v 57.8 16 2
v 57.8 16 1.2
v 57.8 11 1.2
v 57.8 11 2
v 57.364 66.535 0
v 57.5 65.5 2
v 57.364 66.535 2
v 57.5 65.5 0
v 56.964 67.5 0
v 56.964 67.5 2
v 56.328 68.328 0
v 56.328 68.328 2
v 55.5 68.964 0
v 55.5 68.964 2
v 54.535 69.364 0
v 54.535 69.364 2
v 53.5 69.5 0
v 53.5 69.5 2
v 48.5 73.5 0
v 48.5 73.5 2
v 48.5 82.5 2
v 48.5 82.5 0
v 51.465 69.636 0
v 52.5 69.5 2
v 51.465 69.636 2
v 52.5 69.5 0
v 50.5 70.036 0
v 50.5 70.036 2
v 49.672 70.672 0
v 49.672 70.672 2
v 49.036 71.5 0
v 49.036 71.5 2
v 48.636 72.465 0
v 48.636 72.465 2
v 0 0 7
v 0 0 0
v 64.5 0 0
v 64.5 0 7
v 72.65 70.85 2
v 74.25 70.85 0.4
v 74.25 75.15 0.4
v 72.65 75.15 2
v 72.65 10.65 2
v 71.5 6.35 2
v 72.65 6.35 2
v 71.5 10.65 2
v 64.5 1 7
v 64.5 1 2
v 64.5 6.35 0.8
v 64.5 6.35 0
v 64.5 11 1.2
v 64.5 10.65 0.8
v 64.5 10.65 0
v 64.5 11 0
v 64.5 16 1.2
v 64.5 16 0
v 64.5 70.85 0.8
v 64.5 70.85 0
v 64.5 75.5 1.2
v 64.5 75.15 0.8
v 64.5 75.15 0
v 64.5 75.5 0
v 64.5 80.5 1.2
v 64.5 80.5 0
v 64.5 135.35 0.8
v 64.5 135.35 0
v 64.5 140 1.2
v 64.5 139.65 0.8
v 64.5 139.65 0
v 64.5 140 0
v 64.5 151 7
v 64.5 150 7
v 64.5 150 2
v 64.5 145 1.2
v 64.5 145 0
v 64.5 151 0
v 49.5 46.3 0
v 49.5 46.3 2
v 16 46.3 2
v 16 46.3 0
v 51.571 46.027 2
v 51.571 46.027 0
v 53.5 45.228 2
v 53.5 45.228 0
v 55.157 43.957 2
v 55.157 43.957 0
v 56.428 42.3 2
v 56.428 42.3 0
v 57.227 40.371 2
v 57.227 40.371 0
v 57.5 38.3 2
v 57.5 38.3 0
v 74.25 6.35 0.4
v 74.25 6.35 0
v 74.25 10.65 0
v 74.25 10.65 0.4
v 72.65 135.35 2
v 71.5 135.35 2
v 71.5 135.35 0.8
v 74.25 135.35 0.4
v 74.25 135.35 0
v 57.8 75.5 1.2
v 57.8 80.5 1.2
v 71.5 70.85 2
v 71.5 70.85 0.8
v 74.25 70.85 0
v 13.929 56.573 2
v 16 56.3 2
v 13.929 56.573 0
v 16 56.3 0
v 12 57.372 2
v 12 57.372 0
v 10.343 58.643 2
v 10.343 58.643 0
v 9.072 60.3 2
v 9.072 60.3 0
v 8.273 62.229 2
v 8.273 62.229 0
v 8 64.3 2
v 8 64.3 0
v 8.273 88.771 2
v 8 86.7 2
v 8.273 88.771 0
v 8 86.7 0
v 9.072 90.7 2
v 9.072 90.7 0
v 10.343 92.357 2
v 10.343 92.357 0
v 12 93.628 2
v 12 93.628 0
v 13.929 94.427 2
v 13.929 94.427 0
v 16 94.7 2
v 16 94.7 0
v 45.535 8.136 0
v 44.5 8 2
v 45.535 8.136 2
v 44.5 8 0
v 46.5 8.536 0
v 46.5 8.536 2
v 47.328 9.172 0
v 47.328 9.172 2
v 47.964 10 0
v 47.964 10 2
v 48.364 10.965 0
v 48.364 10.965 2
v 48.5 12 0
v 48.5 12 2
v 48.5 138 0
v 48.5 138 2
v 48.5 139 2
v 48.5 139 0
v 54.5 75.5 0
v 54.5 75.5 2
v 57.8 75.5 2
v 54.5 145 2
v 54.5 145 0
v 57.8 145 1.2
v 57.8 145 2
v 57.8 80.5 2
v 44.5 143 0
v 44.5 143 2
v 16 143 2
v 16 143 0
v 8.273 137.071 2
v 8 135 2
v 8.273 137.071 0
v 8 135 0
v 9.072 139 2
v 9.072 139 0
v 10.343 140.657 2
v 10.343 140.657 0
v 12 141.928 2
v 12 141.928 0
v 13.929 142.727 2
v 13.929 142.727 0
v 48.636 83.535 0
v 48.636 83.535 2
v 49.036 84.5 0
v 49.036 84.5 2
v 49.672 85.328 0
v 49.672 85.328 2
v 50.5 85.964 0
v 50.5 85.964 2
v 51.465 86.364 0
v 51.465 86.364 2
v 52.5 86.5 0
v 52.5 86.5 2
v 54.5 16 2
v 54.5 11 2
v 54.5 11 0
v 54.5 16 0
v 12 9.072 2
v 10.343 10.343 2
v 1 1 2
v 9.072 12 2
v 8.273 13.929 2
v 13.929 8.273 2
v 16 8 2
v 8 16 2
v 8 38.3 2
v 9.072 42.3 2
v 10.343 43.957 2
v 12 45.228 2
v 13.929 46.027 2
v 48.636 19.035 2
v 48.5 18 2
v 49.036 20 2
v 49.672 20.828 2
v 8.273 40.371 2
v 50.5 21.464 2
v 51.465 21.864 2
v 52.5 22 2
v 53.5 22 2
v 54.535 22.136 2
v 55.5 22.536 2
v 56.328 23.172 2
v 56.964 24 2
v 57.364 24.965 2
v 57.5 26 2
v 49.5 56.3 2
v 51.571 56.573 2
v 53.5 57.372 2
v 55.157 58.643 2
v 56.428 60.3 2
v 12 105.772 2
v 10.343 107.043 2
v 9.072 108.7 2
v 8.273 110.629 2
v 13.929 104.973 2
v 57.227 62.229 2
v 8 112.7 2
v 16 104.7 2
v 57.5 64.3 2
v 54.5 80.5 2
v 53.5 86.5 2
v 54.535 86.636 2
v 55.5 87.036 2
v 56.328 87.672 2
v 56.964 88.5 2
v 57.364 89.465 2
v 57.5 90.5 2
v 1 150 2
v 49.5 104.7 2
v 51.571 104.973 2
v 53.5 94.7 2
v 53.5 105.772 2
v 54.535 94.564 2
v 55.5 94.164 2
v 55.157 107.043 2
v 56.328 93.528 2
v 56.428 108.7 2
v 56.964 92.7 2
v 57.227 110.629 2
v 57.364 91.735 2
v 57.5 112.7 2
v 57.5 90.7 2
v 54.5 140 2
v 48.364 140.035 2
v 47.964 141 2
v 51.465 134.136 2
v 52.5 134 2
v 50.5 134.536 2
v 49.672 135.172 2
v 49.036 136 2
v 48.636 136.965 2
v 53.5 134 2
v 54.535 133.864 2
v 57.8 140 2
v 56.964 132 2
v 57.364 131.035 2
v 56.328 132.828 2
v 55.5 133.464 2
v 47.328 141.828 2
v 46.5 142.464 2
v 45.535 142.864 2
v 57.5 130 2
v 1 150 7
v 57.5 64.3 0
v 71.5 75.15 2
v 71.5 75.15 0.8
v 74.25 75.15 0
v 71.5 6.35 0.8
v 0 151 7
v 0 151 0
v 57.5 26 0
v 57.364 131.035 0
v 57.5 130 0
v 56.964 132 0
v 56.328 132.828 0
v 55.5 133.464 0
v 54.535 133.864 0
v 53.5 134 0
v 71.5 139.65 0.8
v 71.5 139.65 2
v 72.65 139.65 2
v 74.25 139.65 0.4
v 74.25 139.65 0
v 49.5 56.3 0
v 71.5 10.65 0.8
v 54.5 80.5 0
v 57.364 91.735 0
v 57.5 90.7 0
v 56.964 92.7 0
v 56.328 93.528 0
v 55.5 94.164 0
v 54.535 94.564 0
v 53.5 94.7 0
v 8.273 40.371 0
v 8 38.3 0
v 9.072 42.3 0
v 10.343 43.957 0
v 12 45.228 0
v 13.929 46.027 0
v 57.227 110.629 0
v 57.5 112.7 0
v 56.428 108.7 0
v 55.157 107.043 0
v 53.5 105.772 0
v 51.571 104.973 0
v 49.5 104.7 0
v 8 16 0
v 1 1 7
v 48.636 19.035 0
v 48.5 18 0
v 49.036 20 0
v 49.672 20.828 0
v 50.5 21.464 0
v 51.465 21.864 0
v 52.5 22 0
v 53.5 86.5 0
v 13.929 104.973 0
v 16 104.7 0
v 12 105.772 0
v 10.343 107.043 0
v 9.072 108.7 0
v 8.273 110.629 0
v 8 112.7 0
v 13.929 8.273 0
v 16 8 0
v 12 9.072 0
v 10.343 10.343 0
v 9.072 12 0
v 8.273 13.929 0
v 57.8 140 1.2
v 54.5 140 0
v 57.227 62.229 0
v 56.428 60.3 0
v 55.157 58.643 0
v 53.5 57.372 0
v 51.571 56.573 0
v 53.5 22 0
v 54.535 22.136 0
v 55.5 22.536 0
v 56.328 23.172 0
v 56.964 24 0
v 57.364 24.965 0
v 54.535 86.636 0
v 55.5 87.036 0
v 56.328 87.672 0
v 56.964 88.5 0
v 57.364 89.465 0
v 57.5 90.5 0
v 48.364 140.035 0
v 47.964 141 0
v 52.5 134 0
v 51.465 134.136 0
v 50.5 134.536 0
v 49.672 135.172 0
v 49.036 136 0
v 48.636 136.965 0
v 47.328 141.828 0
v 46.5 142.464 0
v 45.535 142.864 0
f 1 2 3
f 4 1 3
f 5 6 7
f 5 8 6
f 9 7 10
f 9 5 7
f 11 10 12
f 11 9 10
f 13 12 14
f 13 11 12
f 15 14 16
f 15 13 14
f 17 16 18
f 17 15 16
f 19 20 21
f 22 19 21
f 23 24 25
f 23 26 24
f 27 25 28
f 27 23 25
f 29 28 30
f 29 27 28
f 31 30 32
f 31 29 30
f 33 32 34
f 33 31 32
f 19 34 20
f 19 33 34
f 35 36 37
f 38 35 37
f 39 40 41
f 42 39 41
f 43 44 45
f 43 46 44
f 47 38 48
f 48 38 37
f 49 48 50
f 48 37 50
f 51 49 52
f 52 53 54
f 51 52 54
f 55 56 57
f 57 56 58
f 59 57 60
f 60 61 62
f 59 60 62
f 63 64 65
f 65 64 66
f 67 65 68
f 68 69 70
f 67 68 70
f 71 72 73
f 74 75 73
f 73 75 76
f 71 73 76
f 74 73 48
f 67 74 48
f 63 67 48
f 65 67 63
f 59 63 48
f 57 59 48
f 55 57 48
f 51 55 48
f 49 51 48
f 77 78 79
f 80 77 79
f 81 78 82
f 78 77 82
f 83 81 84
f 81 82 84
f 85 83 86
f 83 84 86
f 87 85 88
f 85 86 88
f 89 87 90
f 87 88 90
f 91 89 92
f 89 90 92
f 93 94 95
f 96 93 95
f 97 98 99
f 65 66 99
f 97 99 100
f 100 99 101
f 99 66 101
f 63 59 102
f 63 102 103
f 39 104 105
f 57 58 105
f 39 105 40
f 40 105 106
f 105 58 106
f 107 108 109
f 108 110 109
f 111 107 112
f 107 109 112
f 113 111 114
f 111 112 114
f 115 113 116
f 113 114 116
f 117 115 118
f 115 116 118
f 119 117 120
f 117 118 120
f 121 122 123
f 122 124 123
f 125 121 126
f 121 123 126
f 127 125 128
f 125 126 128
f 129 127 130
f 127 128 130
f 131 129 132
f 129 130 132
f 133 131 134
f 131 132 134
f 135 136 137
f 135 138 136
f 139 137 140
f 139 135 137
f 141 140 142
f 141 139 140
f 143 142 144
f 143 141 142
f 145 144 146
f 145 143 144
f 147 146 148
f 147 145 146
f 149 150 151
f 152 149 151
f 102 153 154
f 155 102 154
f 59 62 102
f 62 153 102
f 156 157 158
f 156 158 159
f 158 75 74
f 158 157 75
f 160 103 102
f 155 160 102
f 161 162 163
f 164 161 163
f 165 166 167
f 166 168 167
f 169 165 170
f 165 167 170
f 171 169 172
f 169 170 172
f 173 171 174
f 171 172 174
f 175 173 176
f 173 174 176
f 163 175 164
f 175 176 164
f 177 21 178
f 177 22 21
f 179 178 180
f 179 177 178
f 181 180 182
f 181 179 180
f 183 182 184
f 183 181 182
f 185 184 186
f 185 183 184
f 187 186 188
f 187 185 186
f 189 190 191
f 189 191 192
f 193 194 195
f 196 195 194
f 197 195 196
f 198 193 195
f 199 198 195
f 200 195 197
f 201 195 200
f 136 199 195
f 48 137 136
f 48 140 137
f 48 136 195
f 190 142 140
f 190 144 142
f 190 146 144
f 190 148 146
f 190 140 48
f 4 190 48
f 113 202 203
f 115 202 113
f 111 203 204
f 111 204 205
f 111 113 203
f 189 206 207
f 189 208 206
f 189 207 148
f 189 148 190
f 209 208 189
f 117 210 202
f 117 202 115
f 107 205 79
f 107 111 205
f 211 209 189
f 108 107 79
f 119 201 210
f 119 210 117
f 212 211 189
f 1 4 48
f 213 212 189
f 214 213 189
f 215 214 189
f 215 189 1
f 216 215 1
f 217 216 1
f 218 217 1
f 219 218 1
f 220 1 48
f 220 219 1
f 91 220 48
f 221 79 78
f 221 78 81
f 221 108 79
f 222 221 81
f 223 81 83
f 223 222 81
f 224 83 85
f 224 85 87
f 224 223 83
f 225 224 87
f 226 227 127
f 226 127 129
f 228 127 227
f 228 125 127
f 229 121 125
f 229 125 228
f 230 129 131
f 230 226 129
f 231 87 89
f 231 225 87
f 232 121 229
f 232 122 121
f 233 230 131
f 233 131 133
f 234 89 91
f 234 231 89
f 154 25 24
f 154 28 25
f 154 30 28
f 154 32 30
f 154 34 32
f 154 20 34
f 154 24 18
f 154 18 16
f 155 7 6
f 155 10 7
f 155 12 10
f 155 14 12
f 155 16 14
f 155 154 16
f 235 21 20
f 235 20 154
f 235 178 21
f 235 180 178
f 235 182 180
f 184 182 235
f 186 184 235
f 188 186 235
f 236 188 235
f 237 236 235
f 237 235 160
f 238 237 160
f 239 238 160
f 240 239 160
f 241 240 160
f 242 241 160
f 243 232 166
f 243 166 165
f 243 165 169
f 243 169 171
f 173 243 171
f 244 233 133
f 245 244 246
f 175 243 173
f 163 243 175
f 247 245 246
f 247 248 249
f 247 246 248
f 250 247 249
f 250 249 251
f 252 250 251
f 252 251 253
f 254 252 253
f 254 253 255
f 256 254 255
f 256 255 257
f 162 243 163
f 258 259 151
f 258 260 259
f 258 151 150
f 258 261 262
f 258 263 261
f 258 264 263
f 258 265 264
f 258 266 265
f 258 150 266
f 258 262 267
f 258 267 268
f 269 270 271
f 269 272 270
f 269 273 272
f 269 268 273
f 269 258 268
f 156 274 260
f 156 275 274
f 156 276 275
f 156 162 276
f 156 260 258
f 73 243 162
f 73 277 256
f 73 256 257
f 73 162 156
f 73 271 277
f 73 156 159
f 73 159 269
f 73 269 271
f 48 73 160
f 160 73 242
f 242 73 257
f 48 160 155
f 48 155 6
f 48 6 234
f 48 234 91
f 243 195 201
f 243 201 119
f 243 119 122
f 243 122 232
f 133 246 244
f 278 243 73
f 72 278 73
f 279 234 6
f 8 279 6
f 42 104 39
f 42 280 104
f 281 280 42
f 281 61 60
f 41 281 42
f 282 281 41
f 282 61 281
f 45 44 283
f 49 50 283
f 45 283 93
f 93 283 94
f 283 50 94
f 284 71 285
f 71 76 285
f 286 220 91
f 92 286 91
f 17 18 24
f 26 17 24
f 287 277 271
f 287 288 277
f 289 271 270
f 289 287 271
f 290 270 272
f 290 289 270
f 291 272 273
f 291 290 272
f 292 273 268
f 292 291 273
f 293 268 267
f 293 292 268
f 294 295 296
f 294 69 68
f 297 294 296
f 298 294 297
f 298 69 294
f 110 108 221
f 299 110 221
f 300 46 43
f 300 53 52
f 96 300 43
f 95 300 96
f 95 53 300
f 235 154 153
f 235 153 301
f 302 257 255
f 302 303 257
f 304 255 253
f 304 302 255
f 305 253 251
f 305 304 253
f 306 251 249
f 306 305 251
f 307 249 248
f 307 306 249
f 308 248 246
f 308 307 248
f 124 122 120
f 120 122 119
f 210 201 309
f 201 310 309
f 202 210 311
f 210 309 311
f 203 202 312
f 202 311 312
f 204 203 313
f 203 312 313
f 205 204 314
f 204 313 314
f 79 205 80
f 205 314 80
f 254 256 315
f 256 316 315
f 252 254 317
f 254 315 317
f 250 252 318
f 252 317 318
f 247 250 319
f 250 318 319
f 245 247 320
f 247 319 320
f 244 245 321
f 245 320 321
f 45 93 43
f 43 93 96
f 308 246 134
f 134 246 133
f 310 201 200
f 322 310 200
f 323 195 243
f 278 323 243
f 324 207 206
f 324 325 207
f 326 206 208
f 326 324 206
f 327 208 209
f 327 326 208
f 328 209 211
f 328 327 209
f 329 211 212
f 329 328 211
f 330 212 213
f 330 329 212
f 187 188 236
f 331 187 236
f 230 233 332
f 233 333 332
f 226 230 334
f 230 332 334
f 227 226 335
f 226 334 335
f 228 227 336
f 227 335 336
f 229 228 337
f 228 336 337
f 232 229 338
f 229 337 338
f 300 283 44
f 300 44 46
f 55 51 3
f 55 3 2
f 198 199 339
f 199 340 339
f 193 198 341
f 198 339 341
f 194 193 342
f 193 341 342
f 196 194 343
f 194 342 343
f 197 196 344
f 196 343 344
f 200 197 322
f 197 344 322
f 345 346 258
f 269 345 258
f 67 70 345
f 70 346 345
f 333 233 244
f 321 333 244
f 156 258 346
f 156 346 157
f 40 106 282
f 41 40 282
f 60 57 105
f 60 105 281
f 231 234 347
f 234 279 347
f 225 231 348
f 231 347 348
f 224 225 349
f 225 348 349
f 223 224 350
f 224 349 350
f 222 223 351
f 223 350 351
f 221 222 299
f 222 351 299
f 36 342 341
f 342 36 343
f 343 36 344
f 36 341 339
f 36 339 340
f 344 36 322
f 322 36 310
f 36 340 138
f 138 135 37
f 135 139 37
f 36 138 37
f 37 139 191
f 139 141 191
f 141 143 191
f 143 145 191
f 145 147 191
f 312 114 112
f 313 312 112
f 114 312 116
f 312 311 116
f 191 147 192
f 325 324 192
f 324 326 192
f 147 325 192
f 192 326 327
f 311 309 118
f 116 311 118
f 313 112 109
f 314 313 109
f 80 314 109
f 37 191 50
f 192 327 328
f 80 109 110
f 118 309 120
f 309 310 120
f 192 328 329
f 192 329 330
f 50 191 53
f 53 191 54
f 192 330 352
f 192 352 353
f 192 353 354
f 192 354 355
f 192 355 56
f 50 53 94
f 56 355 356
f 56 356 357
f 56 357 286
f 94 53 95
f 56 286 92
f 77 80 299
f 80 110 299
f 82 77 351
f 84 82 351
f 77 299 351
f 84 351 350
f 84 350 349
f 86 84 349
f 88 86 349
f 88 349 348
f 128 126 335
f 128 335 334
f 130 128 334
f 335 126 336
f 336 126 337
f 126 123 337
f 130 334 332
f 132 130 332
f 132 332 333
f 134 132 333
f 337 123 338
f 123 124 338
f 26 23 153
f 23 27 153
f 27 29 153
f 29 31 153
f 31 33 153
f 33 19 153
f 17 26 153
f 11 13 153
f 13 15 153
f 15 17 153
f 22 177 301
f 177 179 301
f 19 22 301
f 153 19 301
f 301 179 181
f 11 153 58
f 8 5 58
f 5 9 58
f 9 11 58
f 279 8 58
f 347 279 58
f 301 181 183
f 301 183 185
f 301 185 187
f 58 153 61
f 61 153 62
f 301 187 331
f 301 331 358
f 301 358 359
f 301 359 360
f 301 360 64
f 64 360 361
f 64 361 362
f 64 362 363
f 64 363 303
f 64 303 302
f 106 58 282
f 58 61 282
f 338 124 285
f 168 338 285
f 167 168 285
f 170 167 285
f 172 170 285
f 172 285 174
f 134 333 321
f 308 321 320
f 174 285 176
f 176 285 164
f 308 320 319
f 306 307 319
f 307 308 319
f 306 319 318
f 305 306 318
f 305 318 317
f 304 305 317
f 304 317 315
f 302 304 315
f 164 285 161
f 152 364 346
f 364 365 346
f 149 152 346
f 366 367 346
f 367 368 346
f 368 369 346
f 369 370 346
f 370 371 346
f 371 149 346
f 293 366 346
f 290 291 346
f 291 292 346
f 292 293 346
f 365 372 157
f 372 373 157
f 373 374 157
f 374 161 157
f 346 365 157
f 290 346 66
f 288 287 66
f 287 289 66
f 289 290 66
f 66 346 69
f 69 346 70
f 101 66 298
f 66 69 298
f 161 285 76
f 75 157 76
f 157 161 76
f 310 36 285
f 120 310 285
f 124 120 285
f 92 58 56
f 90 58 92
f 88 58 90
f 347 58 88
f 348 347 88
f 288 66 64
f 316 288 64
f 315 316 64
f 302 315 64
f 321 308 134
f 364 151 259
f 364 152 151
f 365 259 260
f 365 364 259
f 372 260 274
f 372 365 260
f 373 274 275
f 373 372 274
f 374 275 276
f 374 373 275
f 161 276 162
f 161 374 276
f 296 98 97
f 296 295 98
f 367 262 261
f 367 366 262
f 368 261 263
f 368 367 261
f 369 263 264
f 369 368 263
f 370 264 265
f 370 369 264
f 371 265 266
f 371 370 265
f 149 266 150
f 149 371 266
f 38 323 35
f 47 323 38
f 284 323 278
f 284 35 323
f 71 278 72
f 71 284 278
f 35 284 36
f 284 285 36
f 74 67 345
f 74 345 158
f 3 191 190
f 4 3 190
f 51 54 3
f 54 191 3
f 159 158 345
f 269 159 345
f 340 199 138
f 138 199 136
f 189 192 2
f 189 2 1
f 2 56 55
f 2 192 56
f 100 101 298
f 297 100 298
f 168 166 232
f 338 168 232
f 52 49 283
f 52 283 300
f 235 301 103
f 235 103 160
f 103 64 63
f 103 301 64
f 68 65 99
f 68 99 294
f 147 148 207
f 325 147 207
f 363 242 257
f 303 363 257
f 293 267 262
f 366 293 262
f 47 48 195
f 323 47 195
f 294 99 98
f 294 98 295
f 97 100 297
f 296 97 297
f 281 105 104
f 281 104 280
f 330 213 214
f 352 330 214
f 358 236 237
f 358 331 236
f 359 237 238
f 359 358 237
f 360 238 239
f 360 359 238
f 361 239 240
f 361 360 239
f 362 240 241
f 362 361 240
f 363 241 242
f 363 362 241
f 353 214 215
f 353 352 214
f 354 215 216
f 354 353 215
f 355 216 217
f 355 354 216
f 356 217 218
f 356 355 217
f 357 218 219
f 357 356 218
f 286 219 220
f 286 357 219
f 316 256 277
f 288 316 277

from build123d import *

# Parameters (mm, degrees)
F0_W      = 64.5
F0_H      = 151
F1_DEPTH  = 2
F3_DEPTH  = 5
F4_W      = 5
F4_H      = 1.2
F5_DEPTH  = 10
F6_W      = 4.3
F6_H      = 0.8
F7_DEPTH  = 9.75
F8_W      = 2.75
F8_H      = 4.3
F9_DEPTH  = 1.2
F10_W     = 2.75
F10_H     = 4.3
F11_DEPTH = 1.2
F12_W     = 2.75
F12_H     = 4.3
F13_DEPTH = 1.2
F14_W     = 3.3
F14_H     = 5
F15_DEPTH = 5.801
F16_W     = 3.3
F16_H     = 5
F17_DEPTH = 5.801
F18_W     = 3.3
F18_H     = 5
F19_DEPTH = 5.801
F20_SIZE  = 1.6
F22_DEPTH = 2.001
F23_R     = 4
F24_R     = 8


with BuildPart() as f1:
    # F0 (on Top) → F1 (new body)
    with BuildSketch(Plane.XY):
        with Locations((32.25, 75.5)):
            Rectangle(F0_W, F0_H)
    extrude(amount=F1_DEPTH)

    # F2 (on face) → F3 (join)
    with BuildSketch(Plane.XY.offset(2)):
        Polygon((64.5, 150), (64.5, 151), (0, 151), (0, 0), (64.5, 0), (64.5, 1), (1, 1), (1, 150), align=None)
    extrude(amount=F3_DEPTH)

    # F4 (on face) → F5 (cut)
    with BuildSketch(Plane.YZ.offset(64.5)):
        with Locations((142.5, 0.6)):
            Rectangle(F4_W, F4_H)
        with Locations((78, 0.6)):
            Rectangle(F4_W, F4_H)
        with Locations((13.5, 0.6)):
            Rectangle(F4_W, F4_H)
    extrude(amount=-F5_DEPTH, mode=Mode.SUBTRACT)

    # F6 (on face) → F7 (join)
    with BuildSketch(Plane.YZ.offset(64.5)):
        with Locations((8.5, 0.4)):
            Rectangle(F6_W, F6_H)
        with Locations((73, 0.4)):
            Rectangle(F6_W, F6_H)
        with Locations((137.5, 0.4)):
            Rectangle(F6_W, F6_H)
    extrude(amount=F7_DEPTH)

    # F8 (on face) → F9 (join)
    with BuildSketch(Plane.XY.offset(0.8)):
        with Locations((72.875, 8.5)):
            Rectangle(F8_W, F8_H)
    extrude(amount=F9_DEPTH)

    # F10 (on face) → F11 (join)
    with BuildSketch(Plane.XY.offset(0.8)):
        with Locations((72.875, 73)):
            Rectangle(F10_W, F10_H)
    extrude(amount=F11_DEPTH)

    # F12 (on face) → F13 (join)
    with BuildSketch(Plane.XY.offset(0.8)):
        with Locations((72.875, 137.5)):
            Rectangle(F12_W, F12_H)
    extrude(amount=F13_DEPTH)

    # F14 (on face) → F15 (cut, through all)
    with BuildSketch(Plane(origin=(0, 0, 1.2), x_dir=(1, 0, 0), z_dir=(0, 0, -1))):
        with Locations((56.15, -13.5)):
            Rectangle(F14_W, F14_H)
    extrude(amount=-F15_DEPTH, mode=Mode.SUBTRACT)

    # F16 (on face) → F17 (cut, through all)
    with BuildSketch(Plane(origin=(0, 0, 1.2), x_dir=(1, 0, 0), z_dir=(0, 0, -1))):
        with Locations((56.15, -78)):
            Rectangle(F16_W, F16_H)
    extrude(amount=-F17_DEPTH, mode=Mode.SUBTRACT)

    # F18 (on face) → F19 (cut, through all)
    with BuildSketch(Plane(origin=(0, 0, 1.2), x_dir=(1, 0, 0), z_dir=(0, 0, -1))):
        with Locations((56.15, -142.5)):
            Rectangle(F18_W, F18_H)
    extrude(amount=-F19_DEPTH, mode=Mode.SUBTRACT)

    # F20
    f20_edges = [f1.edges().sort_by_distance(p)[0] for p in [
        (74.25, 8.5, 2),
        (74.25, 73, 2),
        (74.25, 137.5, 2),
    ]]
    chamfer(f20_edges, length=F20_SIZE)

    # F21 (on face) → F22 (cut, through all)
    with BuildSketch(Plane.XY.offset(2)):
        Polygon((8, 143), (8, 104.7), (57.5, 104.7), (57.5, 134), (48.5, 134), (48.5, 143), align=None)
        Polygon((8, 56.3), (57.5, 56.3), (57.5, 69.5), (48.5, 69.5), (48.5, 86.5), (57.5, 86.5), (57.5, 94.7), (8, 94.7), align=None)
        Polygon((8, 46.3), (8, 8), (48.5, 8), (48.5, 22), (57.5, 22), (57.5, 46.3), align=None)
    extrude(amount=-F22_DEPTH, mode=Mode.SUBTRACT)

    # F23
    f23_edges = [f1.edges().sort_by_distance(p)[0] for p in [
        (48.5, 134, 1),
        (48.5, 143, 1),
        (57.5, 134, 1),
        (57.5, 94.7, 1),
        (48.5, 86.5, 1),
        (48.5, 69.5, 1),
        (57.5, 69.5, 1),
        (48.5, 22, 1),
        (57.5, 86.5, 1),
        (57.5, 22, 1),
        (48.5, 8, 1),
    ]]
    fillet(f23_edges, radius=F23_R)

    # F24
    f24_edges = [f1.edges().sort_by_distance(p)[0] for p in [
        (8, 8, 1),
        (8, 56.3, 1),
        (8, 104.7, 1),
        (8, 46.3, 1),
        (8, 94.7, 1),
        (8, 143, 1),
        (57.5, 104.7, 1),
        (57.5, 56.3, 1),
        (57.5, 46.3, 1),
    ]]
    fillet(f24_edges, radius=F24_R)


solid = f1.part
